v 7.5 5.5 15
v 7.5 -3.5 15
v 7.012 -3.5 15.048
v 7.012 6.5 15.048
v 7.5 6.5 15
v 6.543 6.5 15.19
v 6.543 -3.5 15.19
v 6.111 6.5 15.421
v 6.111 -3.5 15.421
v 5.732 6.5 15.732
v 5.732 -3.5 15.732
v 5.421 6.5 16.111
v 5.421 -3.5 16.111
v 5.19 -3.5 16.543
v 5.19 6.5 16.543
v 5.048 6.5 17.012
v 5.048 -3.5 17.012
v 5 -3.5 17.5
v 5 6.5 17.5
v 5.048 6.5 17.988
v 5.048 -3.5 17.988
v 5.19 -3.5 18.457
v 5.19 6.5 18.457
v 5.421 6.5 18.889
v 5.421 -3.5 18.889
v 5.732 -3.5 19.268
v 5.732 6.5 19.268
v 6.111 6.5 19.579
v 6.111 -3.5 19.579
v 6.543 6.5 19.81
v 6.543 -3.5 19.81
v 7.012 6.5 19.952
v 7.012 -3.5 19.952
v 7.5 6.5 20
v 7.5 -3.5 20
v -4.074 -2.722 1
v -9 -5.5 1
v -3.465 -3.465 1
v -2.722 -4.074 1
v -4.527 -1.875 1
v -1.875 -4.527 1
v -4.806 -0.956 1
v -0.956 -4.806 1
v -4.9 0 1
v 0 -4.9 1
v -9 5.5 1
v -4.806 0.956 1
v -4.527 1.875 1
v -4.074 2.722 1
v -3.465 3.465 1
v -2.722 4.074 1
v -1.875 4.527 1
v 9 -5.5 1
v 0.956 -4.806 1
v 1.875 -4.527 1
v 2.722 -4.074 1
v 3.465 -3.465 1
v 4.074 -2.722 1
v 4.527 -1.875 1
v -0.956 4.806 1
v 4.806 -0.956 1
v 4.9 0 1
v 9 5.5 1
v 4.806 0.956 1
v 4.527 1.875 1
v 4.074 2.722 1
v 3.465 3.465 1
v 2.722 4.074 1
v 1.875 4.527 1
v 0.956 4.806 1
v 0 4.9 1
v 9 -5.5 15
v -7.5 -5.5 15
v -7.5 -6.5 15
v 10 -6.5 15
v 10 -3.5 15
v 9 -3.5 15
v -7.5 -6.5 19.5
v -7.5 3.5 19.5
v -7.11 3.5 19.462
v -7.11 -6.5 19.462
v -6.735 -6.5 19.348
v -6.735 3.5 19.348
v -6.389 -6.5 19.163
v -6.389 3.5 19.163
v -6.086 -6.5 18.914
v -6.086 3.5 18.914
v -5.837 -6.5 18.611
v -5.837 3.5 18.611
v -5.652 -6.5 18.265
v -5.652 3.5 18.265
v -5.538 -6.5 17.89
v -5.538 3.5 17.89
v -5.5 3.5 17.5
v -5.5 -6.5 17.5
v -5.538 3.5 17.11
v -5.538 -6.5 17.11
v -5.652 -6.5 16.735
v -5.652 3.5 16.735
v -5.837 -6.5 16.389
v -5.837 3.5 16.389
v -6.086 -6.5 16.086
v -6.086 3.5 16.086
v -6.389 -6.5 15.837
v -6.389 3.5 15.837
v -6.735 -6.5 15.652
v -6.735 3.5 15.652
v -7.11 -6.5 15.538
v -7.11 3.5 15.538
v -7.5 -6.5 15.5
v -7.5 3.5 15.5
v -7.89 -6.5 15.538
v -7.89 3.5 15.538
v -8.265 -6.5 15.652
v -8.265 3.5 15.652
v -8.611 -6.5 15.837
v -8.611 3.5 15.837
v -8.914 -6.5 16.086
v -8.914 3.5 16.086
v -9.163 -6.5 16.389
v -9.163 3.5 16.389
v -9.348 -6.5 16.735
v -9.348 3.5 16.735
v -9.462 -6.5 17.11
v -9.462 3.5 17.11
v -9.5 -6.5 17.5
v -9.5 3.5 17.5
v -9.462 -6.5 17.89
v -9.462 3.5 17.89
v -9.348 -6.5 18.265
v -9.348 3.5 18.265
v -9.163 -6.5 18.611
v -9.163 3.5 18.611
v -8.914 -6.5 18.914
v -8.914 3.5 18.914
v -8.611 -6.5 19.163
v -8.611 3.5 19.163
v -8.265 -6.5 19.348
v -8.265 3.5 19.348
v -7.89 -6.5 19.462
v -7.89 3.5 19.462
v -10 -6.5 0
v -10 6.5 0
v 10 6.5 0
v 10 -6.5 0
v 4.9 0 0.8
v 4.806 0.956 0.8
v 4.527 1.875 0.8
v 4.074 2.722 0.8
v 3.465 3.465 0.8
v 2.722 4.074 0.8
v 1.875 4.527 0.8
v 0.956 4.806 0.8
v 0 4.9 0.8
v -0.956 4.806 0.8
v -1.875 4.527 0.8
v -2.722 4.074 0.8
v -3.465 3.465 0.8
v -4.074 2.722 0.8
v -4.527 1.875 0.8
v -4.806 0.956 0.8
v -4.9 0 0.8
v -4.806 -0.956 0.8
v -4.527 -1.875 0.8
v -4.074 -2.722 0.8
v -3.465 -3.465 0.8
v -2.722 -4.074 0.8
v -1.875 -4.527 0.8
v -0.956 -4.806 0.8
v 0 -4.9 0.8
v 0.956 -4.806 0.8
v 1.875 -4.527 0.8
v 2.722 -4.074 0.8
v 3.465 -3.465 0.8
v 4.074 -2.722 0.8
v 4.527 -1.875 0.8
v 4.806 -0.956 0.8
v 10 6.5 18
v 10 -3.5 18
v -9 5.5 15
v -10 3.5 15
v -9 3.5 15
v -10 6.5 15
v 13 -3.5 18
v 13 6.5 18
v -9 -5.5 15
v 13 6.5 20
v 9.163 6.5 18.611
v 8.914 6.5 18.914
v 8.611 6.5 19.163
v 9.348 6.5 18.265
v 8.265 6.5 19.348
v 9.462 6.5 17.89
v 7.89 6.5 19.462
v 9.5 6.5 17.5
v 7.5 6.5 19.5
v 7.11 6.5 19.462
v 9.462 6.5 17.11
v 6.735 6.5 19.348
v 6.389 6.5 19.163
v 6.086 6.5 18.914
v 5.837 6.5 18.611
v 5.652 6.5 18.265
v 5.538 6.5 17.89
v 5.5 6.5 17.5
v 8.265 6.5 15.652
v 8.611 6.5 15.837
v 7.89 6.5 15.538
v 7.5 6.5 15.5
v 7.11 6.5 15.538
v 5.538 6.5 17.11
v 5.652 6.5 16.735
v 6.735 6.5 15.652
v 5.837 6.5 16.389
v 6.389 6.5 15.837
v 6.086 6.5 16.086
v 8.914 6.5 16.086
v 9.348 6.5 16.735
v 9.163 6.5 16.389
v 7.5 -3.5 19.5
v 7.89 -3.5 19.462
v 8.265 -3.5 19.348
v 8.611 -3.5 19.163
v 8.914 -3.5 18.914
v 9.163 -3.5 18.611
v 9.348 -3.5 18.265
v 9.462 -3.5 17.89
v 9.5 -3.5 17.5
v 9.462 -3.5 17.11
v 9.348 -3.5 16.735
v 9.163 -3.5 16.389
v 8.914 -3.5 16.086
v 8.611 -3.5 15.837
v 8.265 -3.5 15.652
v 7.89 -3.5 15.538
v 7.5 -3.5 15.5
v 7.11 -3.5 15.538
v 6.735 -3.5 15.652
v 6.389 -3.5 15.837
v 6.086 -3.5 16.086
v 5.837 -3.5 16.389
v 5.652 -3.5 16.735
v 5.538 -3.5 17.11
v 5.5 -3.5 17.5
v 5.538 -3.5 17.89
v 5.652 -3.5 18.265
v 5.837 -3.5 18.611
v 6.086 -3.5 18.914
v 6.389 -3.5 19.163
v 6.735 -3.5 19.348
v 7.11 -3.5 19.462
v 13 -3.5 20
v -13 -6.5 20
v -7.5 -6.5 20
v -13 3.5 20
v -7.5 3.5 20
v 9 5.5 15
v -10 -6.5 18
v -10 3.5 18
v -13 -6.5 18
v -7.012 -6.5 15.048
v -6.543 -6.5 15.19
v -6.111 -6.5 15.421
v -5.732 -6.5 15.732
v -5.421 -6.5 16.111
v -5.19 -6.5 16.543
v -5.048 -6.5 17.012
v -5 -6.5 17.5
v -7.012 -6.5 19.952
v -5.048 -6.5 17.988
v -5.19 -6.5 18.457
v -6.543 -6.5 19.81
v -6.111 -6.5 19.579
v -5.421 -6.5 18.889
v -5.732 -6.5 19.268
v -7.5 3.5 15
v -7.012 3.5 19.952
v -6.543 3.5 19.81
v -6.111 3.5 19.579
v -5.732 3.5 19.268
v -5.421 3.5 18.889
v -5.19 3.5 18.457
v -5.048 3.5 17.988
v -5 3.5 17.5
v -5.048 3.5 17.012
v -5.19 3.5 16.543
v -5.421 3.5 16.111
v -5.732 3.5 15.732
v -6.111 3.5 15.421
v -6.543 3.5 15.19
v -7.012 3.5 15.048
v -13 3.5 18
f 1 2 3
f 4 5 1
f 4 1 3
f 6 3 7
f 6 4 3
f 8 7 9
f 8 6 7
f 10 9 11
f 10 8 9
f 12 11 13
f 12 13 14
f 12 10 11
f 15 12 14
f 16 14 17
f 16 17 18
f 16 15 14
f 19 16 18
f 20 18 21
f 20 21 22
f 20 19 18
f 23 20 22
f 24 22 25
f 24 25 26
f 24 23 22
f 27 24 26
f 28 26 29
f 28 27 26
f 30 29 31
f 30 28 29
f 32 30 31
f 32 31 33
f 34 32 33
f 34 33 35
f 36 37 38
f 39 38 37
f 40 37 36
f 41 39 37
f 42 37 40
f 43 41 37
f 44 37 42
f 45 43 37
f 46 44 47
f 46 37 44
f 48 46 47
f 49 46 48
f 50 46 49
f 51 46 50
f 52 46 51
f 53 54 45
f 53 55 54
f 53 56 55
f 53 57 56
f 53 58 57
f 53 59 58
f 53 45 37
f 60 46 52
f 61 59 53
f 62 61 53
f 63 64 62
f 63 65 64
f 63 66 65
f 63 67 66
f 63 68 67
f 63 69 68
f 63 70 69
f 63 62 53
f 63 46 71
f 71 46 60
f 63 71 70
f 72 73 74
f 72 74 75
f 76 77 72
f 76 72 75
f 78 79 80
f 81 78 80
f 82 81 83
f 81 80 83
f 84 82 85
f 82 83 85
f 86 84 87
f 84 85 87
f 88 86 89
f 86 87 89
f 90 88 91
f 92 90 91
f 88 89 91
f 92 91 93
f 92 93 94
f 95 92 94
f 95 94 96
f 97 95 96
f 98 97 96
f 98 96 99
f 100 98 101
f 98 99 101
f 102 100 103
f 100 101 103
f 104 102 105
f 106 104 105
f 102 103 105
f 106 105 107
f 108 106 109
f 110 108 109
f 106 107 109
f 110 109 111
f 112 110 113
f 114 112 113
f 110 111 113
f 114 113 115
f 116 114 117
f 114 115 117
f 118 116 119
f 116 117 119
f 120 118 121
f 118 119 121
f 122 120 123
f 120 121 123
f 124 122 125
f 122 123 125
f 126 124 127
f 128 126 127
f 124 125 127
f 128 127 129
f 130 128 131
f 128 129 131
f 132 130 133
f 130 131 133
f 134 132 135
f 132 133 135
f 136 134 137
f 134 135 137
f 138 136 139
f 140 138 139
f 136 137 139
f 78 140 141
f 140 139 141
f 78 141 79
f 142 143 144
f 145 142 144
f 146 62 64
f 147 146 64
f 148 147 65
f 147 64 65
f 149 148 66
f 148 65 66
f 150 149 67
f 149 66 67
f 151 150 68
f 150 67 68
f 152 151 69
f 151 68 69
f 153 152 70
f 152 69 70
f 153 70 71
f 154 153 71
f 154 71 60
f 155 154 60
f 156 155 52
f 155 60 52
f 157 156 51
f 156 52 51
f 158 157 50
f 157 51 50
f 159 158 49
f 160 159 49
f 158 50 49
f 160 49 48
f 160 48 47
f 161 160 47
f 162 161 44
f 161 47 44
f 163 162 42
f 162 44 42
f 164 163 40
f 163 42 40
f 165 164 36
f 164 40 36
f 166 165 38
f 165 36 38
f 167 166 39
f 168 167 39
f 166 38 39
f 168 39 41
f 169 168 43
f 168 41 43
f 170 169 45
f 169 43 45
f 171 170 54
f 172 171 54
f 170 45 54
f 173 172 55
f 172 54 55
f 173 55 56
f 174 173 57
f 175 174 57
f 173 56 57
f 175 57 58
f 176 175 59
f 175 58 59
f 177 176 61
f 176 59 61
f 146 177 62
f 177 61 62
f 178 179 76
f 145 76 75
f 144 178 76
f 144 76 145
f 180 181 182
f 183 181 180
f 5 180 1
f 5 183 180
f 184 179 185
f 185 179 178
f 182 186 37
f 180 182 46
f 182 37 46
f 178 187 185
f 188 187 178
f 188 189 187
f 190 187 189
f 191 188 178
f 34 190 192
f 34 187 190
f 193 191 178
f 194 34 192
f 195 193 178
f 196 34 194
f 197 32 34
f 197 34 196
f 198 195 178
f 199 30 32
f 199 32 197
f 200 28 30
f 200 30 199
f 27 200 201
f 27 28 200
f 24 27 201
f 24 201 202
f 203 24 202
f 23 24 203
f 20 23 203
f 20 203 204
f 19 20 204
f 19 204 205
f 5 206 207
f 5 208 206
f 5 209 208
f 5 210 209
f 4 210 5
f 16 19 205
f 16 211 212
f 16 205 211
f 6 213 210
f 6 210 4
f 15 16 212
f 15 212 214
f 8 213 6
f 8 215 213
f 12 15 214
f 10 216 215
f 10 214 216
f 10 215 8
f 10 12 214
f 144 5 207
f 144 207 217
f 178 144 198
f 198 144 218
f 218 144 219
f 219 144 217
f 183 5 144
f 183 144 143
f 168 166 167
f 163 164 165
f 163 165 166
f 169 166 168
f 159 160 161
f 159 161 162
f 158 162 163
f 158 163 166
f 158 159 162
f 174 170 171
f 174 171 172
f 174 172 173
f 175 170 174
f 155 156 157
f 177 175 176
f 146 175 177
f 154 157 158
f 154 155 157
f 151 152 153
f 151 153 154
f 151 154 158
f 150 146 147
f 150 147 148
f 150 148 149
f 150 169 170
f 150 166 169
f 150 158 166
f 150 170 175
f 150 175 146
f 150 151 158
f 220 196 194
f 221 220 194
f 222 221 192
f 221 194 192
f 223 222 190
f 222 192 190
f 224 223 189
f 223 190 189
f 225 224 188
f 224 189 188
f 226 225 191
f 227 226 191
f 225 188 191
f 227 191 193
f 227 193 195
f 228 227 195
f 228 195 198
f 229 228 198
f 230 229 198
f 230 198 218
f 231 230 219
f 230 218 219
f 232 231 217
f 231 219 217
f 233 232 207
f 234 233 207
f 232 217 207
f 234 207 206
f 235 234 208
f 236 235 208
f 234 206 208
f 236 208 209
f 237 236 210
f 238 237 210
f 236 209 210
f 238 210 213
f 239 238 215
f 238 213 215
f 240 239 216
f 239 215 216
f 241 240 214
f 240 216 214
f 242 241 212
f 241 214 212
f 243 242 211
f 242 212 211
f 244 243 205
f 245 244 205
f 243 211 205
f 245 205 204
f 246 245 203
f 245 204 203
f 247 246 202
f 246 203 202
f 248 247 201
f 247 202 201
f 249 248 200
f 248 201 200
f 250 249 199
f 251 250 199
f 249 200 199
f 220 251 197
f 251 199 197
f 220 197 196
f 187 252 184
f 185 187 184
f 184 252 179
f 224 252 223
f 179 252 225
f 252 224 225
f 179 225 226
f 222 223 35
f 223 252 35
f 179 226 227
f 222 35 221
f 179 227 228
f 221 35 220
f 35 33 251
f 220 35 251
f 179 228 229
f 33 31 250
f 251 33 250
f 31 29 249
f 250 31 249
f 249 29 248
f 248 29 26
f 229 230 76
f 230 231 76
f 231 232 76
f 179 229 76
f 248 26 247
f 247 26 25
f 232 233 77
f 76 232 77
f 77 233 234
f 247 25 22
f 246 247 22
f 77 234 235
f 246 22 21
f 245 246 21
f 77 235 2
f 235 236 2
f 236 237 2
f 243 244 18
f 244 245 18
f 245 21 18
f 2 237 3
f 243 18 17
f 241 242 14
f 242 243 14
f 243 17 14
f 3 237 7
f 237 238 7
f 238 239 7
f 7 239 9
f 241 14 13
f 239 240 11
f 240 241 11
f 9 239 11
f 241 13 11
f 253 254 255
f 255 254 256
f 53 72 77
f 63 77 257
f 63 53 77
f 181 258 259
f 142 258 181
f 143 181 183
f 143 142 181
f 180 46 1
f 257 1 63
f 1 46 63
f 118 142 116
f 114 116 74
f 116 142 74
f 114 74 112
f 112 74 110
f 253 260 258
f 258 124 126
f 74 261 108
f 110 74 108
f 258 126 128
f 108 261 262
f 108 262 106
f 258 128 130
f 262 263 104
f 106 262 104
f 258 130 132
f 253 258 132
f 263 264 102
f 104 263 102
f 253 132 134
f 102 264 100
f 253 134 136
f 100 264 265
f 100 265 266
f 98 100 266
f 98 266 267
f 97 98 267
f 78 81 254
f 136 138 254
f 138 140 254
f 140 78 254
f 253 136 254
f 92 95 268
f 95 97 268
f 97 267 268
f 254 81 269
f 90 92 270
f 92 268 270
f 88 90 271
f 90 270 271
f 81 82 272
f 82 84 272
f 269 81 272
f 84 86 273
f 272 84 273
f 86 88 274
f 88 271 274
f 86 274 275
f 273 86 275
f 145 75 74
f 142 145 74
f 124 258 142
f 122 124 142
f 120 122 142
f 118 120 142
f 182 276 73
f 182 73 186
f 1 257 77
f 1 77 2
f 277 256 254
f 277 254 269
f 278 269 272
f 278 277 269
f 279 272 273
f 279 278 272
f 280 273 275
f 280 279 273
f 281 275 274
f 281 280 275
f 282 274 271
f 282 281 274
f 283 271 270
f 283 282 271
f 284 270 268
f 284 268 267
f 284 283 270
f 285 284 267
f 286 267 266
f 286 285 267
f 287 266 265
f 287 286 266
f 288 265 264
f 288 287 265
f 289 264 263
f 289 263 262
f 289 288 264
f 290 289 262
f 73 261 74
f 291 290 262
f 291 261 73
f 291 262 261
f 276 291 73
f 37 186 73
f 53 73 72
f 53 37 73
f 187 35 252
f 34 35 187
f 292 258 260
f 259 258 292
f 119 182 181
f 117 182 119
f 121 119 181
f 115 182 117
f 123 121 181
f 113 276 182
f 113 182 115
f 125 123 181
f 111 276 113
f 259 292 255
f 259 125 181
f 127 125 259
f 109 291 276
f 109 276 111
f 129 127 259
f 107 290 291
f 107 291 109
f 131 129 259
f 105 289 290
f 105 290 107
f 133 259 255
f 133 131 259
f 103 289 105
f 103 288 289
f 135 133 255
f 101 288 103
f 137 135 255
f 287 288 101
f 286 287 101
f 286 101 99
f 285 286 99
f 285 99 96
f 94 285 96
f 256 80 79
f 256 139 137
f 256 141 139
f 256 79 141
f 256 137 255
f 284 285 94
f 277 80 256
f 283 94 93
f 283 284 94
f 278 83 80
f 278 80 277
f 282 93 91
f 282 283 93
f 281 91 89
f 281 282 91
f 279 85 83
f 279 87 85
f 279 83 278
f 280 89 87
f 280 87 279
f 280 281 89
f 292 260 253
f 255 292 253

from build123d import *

# Parameters (mm, degrees)
SKETCH_1_W          = 20
SKETCH_1_H          = 13
EXTRUDE_1_DEPTH     = 15
SHELL_1_T           = -1
SKETCH_2_R          = 2.5
SKETCH_2_R_2        = 2
EXTRUDE_4_DEPTH     = 10
SKETCH_3_R          = 4.9
CUT_EXTRUDE_1_DEPTH = 0.2
SKETCH_9_R          = 2.5
SKETCH_9_R_2        = 2
EXTRUDE_8_DEPTH     = 10
SKETCH_6_W          = 2
SKETCH_6_H          = 10
EXTRUDE_10_DEPTH    = 3
SKETCH_10_W         = 2
SKETCH_10_H         = 10
EXTRUDE_11_DEPTH    = 3


with BuildPart() as part:
    # 스케치1 → 보스-돌출1 (new body)
    with BuildSketch(Plane.XY):
        Rectangle(SKETCH_1_W, SKETCH_1_H)
    extrude(amount=EXTRUDE_1_DEPTH)

    # 쉘1
    shell_1_openings = [part.faces().sort_by_distance(p)[0] for p in [
        (0, 0, 15),
    ]]
    offset(amount=SHELL_1_T, openings=shell_1_openings, kind=Kind.INTERSECTION)

    # 스케치3 → 컷-돌출1 (cut)
    with BuildSketch(Plane.XY.offset(1)):
        Circle(SKETCH_3_R)
    extrude(amount=-CUT_EXTRUDE_1_DEPTH, mode=Mode.SUBTRACT)

    # 스케치9 → 보스-돌출8 (add)
    # profile 1 of 3: a face of its own
    with BuildSketch(Plane(origin=(0, 6.5, 0), x_dir=(1, 0, 0), z_dir=(0, 1, 0))):
        with BuildLine():
            Line((10, -17.5), (10, -15))
            Line((10, -15), (7.5, -15))
            ThreePointArc((7.5, -15), (9.267766953, -15.732233047), (10, -17.5))
        make_face()
    # profile 2 of 3: a face of its own
    with BuildSketch(Plane(origin=(0, 6.5, 0), x_dir=(1, 0, 0), z_dir=(0, 1, 0))):
        with BuildLine():
            Line((10, -20), (10, -17.5))
            ThreePointArc((10, -17.5), (9.267766953, -19.267766953), (7.5, -20))
            Line((7.5, -20), (10, -20))
        make_face()
    # profile 3 of 3: a face of its own
    with BuildSketch(Plane(origin=(0, 6.5, 0), x_dir=(1, 0, 0), z_dir=(0, 1, 0))):
        with Locations((7.5, -17.5)):
            Circle(SKETCH_9_R)
        with Locations(Location((7.5, -17.5, 0), (0, 0, 270))):
            Circle(SKETCH_9_R_2, mode=Mode.SUBTRACT)
    extrude(amount=-EXTRUDE_8_DEPTH)


with BuildPart() as body_2:
    # 스케치2 → 보스-돌출4 (new body)
    # profile 1 of 3: a face of its own
    with BuildSketch(Plane(origin=(0, 3.5, 0), x_dir=(1, 0, 0), z_dir=(0, 1, 0))):
        with BuildLine():
            ThreePointArc((-7.5, -20), (-9.267766953, -19.267766953), (-10, -17.5))
            Line((-10, -17.5), (-10, -20))
            Line((-10, -20), (-7.5, -20))
        make_face()
    # profile 2 of 3: a face of its own
    with BuildSketch(Plane(origin=(0, 3.5, 0), x_dir=(1, 0, 0), z_dir=(0, 1, 0))):
        with Locations((-7.5, -17.5)):
            Circle(SKETCH_2_R)
        with Locations(Location((-7.5, -17.5, 0), (0, 0, 270))):
            Circle(SKETCH_2_R_2, mode=Mode.SUBTRACT)
    # profile 3 of 3: a face of its own
    with BuildSketch(Plane(origin=(0, 3.5, 0), x_dir=(1, 0, 0), z_dir=(0, 1, 0))):
        with BuildLine():
            Line((-7.5, -15), (-10, -15))
            Line((-10, -15), (-10, -17.5))
            ThreePointArc((-10, -17.5), (-9.267766953, -15.732233047), (-7.5, -15))
        make_face()
    extrude(amount=-EXTRUDE_4_DEPTH)


    add(part.part)  # 보스-돌출10 merges part
    # 스케치6 → 보스-돌출10 (add)
    with BuildSketch(Plane.ZY.offset(10)):
        with Locations((19, -1.5)):
            Rectangle(SKETCH_6_W, SKETCH_6_H)
    extrude(amount=EXTRUDE_10_DEPTH)

    # 스케치10 → 보스-돌출11 (add)
    with BuildSketch(Plane(origin=(10, 0, 0), x_dir=(0, 0, -1), z_dir=(1, 0, 0))):
        with Locations((-19, 1.5)):
            Rectangle(SKETCH_10_W, SKETCH_10_H)
    extrude(amount=EXTRUDE_11_DEPTH)


solid = body_2.part
